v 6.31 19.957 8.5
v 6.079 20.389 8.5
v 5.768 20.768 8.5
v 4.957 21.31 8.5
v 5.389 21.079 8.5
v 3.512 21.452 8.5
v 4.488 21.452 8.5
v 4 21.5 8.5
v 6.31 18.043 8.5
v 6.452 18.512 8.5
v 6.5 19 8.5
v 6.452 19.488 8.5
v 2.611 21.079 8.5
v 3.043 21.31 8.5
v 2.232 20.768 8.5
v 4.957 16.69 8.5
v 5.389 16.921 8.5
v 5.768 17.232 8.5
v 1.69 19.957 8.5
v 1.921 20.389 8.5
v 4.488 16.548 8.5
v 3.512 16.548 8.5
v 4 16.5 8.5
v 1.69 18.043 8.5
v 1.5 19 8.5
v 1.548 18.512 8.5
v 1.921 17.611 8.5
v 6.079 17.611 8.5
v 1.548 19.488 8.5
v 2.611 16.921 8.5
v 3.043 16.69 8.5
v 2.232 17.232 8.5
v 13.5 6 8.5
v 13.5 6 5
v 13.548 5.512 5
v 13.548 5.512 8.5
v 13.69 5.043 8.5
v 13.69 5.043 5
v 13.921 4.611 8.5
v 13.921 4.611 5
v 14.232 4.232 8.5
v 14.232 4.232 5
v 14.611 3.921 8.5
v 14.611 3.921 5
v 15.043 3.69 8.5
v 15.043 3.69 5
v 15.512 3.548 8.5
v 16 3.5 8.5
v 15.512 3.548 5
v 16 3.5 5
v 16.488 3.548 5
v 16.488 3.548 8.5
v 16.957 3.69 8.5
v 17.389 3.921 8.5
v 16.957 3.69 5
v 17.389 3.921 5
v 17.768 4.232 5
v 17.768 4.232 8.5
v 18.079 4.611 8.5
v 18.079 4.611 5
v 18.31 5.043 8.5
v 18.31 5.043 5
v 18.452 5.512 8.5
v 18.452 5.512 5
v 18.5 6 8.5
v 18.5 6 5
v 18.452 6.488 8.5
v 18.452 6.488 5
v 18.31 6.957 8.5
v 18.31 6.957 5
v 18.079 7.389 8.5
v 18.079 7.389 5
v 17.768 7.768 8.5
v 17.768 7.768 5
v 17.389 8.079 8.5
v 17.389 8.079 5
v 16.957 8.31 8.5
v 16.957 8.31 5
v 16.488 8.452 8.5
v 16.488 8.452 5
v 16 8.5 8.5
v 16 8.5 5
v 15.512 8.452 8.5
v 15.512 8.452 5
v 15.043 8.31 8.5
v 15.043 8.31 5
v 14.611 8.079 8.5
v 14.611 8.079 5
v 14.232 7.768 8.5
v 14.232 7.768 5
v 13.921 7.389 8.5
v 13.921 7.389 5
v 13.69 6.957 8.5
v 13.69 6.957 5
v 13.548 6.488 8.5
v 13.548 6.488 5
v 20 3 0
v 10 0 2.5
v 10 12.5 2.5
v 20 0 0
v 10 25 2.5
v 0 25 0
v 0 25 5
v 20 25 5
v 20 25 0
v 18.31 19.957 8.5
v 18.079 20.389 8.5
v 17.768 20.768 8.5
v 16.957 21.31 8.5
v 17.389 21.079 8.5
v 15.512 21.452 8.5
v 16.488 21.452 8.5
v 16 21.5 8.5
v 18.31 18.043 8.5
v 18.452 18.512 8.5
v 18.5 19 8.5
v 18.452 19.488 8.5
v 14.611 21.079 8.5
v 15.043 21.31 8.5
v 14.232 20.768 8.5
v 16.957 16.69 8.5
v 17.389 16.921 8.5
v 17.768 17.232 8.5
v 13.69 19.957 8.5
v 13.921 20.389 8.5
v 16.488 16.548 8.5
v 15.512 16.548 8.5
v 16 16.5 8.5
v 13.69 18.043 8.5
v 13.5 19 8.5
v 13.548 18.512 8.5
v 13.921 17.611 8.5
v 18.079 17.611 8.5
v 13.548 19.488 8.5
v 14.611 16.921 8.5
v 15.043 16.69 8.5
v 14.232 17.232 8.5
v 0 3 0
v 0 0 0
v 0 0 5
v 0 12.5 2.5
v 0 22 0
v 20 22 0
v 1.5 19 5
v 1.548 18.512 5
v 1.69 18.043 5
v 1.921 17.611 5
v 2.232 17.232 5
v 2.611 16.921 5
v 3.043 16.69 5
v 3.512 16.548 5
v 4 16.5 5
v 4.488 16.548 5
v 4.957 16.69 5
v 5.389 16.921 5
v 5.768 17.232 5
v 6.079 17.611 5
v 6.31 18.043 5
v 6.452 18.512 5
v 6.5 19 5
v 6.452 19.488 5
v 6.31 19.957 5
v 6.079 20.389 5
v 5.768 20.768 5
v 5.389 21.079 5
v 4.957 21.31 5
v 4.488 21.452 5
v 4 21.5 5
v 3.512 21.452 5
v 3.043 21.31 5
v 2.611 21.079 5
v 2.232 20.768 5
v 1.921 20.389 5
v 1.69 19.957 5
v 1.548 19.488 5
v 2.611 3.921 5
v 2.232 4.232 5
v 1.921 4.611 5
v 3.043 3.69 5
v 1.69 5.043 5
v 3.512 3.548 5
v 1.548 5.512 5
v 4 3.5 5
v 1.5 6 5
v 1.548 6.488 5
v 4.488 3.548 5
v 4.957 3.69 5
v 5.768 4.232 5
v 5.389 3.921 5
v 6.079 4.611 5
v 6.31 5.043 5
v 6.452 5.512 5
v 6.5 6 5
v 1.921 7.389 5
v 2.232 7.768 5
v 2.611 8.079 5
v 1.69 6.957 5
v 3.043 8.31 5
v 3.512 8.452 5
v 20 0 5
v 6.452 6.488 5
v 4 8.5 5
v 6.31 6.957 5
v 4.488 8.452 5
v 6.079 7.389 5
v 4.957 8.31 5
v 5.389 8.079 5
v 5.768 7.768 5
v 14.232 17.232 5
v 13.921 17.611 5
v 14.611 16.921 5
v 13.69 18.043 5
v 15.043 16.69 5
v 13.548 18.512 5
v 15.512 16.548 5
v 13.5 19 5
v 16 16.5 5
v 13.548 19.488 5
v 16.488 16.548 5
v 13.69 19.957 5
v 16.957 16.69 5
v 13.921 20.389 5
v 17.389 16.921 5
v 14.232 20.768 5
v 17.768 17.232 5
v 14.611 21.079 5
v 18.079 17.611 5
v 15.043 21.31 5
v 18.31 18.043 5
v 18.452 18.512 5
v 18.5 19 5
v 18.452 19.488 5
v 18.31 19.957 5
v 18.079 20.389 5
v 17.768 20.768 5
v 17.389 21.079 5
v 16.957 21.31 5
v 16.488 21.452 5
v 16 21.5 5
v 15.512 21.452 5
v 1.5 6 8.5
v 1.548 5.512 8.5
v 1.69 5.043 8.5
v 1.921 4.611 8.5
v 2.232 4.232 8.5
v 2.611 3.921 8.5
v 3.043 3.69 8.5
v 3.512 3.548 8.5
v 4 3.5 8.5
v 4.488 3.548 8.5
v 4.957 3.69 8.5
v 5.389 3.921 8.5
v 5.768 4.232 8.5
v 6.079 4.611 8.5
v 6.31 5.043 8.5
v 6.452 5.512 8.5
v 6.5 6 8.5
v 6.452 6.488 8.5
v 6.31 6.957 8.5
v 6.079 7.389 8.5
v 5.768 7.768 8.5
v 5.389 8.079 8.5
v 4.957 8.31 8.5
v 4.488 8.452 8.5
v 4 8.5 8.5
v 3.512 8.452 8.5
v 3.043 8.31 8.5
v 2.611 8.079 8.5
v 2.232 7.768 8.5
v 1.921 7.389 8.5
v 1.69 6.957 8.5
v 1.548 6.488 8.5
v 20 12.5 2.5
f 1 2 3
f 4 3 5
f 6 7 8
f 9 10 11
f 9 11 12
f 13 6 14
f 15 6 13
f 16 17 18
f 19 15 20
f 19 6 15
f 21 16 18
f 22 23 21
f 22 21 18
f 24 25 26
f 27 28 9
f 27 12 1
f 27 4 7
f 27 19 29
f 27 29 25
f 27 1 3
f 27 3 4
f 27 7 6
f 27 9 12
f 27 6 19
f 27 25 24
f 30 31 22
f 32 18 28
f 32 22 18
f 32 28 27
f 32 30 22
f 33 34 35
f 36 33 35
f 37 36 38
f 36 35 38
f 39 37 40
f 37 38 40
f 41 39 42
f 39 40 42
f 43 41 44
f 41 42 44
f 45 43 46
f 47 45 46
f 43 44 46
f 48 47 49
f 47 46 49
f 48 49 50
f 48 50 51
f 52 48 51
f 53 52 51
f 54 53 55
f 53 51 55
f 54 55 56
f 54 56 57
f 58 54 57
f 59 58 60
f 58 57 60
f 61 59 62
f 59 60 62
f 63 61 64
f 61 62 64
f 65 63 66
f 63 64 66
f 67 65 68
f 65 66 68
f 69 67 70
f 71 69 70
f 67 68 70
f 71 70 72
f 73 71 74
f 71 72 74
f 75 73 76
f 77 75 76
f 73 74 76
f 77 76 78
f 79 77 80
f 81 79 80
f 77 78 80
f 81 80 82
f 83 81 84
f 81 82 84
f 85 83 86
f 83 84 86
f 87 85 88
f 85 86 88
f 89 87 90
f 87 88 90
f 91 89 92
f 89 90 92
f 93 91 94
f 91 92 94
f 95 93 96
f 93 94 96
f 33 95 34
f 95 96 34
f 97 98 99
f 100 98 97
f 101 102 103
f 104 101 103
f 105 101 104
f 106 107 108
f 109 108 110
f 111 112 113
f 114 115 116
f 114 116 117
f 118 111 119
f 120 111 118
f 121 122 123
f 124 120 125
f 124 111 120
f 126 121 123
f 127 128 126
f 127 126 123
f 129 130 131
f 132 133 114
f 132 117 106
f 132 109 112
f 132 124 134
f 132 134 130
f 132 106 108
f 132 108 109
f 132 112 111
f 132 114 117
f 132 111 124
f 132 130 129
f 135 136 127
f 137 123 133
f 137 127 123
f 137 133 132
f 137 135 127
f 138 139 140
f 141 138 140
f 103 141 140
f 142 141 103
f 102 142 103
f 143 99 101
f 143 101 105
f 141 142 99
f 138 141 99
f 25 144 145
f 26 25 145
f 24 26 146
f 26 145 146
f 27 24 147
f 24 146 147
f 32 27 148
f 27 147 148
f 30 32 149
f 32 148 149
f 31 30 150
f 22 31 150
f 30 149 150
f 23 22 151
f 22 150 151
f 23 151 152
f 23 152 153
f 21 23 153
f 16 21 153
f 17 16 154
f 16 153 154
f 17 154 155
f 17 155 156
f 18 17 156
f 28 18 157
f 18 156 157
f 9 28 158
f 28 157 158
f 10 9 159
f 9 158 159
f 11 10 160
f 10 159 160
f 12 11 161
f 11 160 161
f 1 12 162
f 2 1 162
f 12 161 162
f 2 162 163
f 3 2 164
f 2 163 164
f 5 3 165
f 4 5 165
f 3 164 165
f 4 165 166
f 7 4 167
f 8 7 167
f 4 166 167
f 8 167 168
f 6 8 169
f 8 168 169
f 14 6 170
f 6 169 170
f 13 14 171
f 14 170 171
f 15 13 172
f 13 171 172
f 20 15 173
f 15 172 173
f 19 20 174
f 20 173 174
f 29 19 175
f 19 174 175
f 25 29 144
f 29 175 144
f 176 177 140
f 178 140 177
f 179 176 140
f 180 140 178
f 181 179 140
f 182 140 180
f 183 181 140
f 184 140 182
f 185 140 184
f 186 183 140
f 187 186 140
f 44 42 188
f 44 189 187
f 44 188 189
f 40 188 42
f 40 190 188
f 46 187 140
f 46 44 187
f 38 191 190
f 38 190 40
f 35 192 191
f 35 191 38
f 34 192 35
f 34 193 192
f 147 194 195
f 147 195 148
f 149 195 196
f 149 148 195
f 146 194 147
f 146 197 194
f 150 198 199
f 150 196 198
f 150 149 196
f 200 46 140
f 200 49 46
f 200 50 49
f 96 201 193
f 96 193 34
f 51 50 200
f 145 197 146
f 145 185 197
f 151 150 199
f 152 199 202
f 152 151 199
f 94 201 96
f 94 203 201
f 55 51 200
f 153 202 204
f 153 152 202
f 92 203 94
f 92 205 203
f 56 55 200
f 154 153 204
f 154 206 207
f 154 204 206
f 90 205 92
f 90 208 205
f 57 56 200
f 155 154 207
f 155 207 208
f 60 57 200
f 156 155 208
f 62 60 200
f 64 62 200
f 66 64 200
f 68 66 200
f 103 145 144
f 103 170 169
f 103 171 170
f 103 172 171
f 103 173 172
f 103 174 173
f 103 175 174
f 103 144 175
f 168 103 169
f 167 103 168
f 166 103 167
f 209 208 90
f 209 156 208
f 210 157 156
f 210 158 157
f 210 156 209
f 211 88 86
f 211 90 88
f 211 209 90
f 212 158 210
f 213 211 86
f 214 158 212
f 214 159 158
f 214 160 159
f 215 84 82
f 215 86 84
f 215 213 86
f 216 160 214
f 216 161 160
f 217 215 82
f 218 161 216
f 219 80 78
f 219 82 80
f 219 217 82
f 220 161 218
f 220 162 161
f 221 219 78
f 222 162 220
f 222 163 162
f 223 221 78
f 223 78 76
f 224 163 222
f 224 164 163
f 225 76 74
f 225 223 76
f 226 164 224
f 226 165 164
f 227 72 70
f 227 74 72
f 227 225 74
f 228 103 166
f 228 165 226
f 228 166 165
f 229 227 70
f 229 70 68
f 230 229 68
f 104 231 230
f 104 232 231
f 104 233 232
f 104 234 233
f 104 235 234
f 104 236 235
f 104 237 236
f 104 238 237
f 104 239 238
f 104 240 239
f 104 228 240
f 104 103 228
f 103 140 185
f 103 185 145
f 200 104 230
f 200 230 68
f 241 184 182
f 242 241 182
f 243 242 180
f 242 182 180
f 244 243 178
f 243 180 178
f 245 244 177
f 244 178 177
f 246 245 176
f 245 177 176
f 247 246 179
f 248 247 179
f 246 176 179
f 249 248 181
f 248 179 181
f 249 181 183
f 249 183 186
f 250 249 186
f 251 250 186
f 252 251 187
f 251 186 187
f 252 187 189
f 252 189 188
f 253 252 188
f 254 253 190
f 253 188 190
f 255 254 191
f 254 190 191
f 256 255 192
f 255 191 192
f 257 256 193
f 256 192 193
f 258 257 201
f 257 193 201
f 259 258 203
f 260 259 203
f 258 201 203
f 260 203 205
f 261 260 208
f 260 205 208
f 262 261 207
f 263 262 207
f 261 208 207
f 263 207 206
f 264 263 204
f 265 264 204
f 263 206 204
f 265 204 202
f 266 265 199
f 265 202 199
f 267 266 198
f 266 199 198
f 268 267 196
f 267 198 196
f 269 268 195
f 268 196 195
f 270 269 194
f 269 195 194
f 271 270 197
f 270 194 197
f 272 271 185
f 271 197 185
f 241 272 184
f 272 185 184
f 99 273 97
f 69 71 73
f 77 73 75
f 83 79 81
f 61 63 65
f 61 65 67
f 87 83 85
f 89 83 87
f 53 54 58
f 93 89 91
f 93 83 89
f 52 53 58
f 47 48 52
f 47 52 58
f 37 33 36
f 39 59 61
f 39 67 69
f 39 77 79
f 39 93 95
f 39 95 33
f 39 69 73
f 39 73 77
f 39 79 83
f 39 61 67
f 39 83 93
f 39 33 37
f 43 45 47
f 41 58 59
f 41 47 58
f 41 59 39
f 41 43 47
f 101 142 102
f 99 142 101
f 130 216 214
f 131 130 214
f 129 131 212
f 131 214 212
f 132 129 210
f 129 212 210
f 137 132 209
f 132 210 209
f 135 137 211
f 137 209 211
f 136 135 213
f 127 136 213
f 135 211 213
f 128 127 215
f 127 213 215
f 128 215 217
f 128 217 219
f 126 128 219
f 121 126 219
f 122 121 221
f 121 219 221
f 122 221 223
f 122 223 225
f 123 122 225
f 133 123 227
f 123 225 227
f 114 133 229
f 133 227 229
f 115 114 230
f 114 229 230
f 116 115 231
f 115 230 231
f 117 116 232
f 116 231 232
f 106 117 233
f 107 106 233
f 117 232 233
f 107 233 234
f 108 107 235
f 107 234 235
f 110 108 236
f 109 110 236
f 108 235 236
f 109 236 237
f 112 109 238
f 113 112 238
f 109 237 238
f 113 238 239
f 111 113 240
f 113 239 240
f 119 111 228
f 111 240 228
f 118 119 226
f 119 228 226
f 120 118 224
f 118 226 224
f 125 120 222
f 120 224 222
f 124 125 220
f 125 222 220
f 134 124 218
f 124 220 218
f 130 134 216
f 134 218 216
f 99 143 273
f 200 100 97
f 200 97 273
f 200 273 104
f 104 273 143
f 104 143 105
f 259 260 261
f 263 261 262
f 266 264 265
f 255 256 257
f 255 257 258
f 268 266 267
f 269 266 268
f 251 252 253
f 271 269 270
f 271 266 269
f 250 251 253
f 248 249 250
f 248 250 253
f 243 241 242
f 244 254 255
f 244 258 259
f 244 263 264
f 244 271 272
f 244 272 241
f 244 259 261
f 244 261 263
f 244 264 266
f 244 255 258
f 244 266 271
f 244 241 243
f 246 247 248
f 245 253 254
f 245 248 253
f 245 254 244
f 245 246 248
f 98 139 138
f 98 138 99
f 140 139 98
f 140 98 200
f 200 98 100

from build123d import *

# Parameters (mm, degrees)
SKETCH1_W           = 20
SKETCH1_H           = 25
BOSS_EXTRUDE1_DEPTH = 5
SKETCH2_R           = 2.5
BOSS_EXTRUDE2_DEPTH = 3.5
CUT_EXTRUDE1_DEPTH  = 23.5
CUT_EXTRUDE2_DEPTH  = 33.5


with BuildPart() as part:
    # Sketch1 → Boss-Extrude1 (new body)
    with BuildSketch(Plane.XY):
        with Locations((10, 12.5)):
            Rectangle(SKETCH1_W, SKETCH1_H)
    extrude(amount=BOSS_EXTRUDE1_DEPTH)

    # Sketch2 → Boss-Extrude2 (add)
    with BuildSketch(Plane.XY.offset(5)):
        with Locations(Location((4, 19, 0), (0, 0, 180))):
            Circle(SKETCH2_R)
        with Locations(Location((16, 19, 0), (0, 0, 180))):
            Circle(SKETCH2_R)
        with Locations(Location((16, 6, 0), (0, 0, 180))):
            Circle(SKETCH2_R)
        with Locations(Location((4, 6, 0), (0, 0, 180))):
            Circle(SKETCH2_R)
    extrude(amount=BOSS_EXTRUDE2_DEPTH)

    # Sketch3 → Cut-Extrude1 (cut)
    with BuildSketch(Plane(origin=(20, 0, 0), x_dir=(0, 0, -1), z_dir=(1, 0, 0))):
        Polygon((0, 22), (-2.5, 12.5), (0, 12.5), align=None)
        Polygon((0, 12.5), (-2.5, 12.5), (0, 3), align=None)
    extrude(amount=-CUT_EXTRUDE1_DEPTH, mode=Mode.SUBTRACT)

    # Sketch4 → Cut-Extrude2 (cut)
    with BuildSketch(Plane(origin=(0, 0, 0), x_dir=(-1, 0, 0), z_dir=(0, -1, 0))):
        Polygon((0, 0), (-10, -2.5), (-20, 0), align=None)
    extrude(amount=-CUT_EXTRUDE2_DEPTH, mode=Mode.SUBTRACT)


solid = part.part
